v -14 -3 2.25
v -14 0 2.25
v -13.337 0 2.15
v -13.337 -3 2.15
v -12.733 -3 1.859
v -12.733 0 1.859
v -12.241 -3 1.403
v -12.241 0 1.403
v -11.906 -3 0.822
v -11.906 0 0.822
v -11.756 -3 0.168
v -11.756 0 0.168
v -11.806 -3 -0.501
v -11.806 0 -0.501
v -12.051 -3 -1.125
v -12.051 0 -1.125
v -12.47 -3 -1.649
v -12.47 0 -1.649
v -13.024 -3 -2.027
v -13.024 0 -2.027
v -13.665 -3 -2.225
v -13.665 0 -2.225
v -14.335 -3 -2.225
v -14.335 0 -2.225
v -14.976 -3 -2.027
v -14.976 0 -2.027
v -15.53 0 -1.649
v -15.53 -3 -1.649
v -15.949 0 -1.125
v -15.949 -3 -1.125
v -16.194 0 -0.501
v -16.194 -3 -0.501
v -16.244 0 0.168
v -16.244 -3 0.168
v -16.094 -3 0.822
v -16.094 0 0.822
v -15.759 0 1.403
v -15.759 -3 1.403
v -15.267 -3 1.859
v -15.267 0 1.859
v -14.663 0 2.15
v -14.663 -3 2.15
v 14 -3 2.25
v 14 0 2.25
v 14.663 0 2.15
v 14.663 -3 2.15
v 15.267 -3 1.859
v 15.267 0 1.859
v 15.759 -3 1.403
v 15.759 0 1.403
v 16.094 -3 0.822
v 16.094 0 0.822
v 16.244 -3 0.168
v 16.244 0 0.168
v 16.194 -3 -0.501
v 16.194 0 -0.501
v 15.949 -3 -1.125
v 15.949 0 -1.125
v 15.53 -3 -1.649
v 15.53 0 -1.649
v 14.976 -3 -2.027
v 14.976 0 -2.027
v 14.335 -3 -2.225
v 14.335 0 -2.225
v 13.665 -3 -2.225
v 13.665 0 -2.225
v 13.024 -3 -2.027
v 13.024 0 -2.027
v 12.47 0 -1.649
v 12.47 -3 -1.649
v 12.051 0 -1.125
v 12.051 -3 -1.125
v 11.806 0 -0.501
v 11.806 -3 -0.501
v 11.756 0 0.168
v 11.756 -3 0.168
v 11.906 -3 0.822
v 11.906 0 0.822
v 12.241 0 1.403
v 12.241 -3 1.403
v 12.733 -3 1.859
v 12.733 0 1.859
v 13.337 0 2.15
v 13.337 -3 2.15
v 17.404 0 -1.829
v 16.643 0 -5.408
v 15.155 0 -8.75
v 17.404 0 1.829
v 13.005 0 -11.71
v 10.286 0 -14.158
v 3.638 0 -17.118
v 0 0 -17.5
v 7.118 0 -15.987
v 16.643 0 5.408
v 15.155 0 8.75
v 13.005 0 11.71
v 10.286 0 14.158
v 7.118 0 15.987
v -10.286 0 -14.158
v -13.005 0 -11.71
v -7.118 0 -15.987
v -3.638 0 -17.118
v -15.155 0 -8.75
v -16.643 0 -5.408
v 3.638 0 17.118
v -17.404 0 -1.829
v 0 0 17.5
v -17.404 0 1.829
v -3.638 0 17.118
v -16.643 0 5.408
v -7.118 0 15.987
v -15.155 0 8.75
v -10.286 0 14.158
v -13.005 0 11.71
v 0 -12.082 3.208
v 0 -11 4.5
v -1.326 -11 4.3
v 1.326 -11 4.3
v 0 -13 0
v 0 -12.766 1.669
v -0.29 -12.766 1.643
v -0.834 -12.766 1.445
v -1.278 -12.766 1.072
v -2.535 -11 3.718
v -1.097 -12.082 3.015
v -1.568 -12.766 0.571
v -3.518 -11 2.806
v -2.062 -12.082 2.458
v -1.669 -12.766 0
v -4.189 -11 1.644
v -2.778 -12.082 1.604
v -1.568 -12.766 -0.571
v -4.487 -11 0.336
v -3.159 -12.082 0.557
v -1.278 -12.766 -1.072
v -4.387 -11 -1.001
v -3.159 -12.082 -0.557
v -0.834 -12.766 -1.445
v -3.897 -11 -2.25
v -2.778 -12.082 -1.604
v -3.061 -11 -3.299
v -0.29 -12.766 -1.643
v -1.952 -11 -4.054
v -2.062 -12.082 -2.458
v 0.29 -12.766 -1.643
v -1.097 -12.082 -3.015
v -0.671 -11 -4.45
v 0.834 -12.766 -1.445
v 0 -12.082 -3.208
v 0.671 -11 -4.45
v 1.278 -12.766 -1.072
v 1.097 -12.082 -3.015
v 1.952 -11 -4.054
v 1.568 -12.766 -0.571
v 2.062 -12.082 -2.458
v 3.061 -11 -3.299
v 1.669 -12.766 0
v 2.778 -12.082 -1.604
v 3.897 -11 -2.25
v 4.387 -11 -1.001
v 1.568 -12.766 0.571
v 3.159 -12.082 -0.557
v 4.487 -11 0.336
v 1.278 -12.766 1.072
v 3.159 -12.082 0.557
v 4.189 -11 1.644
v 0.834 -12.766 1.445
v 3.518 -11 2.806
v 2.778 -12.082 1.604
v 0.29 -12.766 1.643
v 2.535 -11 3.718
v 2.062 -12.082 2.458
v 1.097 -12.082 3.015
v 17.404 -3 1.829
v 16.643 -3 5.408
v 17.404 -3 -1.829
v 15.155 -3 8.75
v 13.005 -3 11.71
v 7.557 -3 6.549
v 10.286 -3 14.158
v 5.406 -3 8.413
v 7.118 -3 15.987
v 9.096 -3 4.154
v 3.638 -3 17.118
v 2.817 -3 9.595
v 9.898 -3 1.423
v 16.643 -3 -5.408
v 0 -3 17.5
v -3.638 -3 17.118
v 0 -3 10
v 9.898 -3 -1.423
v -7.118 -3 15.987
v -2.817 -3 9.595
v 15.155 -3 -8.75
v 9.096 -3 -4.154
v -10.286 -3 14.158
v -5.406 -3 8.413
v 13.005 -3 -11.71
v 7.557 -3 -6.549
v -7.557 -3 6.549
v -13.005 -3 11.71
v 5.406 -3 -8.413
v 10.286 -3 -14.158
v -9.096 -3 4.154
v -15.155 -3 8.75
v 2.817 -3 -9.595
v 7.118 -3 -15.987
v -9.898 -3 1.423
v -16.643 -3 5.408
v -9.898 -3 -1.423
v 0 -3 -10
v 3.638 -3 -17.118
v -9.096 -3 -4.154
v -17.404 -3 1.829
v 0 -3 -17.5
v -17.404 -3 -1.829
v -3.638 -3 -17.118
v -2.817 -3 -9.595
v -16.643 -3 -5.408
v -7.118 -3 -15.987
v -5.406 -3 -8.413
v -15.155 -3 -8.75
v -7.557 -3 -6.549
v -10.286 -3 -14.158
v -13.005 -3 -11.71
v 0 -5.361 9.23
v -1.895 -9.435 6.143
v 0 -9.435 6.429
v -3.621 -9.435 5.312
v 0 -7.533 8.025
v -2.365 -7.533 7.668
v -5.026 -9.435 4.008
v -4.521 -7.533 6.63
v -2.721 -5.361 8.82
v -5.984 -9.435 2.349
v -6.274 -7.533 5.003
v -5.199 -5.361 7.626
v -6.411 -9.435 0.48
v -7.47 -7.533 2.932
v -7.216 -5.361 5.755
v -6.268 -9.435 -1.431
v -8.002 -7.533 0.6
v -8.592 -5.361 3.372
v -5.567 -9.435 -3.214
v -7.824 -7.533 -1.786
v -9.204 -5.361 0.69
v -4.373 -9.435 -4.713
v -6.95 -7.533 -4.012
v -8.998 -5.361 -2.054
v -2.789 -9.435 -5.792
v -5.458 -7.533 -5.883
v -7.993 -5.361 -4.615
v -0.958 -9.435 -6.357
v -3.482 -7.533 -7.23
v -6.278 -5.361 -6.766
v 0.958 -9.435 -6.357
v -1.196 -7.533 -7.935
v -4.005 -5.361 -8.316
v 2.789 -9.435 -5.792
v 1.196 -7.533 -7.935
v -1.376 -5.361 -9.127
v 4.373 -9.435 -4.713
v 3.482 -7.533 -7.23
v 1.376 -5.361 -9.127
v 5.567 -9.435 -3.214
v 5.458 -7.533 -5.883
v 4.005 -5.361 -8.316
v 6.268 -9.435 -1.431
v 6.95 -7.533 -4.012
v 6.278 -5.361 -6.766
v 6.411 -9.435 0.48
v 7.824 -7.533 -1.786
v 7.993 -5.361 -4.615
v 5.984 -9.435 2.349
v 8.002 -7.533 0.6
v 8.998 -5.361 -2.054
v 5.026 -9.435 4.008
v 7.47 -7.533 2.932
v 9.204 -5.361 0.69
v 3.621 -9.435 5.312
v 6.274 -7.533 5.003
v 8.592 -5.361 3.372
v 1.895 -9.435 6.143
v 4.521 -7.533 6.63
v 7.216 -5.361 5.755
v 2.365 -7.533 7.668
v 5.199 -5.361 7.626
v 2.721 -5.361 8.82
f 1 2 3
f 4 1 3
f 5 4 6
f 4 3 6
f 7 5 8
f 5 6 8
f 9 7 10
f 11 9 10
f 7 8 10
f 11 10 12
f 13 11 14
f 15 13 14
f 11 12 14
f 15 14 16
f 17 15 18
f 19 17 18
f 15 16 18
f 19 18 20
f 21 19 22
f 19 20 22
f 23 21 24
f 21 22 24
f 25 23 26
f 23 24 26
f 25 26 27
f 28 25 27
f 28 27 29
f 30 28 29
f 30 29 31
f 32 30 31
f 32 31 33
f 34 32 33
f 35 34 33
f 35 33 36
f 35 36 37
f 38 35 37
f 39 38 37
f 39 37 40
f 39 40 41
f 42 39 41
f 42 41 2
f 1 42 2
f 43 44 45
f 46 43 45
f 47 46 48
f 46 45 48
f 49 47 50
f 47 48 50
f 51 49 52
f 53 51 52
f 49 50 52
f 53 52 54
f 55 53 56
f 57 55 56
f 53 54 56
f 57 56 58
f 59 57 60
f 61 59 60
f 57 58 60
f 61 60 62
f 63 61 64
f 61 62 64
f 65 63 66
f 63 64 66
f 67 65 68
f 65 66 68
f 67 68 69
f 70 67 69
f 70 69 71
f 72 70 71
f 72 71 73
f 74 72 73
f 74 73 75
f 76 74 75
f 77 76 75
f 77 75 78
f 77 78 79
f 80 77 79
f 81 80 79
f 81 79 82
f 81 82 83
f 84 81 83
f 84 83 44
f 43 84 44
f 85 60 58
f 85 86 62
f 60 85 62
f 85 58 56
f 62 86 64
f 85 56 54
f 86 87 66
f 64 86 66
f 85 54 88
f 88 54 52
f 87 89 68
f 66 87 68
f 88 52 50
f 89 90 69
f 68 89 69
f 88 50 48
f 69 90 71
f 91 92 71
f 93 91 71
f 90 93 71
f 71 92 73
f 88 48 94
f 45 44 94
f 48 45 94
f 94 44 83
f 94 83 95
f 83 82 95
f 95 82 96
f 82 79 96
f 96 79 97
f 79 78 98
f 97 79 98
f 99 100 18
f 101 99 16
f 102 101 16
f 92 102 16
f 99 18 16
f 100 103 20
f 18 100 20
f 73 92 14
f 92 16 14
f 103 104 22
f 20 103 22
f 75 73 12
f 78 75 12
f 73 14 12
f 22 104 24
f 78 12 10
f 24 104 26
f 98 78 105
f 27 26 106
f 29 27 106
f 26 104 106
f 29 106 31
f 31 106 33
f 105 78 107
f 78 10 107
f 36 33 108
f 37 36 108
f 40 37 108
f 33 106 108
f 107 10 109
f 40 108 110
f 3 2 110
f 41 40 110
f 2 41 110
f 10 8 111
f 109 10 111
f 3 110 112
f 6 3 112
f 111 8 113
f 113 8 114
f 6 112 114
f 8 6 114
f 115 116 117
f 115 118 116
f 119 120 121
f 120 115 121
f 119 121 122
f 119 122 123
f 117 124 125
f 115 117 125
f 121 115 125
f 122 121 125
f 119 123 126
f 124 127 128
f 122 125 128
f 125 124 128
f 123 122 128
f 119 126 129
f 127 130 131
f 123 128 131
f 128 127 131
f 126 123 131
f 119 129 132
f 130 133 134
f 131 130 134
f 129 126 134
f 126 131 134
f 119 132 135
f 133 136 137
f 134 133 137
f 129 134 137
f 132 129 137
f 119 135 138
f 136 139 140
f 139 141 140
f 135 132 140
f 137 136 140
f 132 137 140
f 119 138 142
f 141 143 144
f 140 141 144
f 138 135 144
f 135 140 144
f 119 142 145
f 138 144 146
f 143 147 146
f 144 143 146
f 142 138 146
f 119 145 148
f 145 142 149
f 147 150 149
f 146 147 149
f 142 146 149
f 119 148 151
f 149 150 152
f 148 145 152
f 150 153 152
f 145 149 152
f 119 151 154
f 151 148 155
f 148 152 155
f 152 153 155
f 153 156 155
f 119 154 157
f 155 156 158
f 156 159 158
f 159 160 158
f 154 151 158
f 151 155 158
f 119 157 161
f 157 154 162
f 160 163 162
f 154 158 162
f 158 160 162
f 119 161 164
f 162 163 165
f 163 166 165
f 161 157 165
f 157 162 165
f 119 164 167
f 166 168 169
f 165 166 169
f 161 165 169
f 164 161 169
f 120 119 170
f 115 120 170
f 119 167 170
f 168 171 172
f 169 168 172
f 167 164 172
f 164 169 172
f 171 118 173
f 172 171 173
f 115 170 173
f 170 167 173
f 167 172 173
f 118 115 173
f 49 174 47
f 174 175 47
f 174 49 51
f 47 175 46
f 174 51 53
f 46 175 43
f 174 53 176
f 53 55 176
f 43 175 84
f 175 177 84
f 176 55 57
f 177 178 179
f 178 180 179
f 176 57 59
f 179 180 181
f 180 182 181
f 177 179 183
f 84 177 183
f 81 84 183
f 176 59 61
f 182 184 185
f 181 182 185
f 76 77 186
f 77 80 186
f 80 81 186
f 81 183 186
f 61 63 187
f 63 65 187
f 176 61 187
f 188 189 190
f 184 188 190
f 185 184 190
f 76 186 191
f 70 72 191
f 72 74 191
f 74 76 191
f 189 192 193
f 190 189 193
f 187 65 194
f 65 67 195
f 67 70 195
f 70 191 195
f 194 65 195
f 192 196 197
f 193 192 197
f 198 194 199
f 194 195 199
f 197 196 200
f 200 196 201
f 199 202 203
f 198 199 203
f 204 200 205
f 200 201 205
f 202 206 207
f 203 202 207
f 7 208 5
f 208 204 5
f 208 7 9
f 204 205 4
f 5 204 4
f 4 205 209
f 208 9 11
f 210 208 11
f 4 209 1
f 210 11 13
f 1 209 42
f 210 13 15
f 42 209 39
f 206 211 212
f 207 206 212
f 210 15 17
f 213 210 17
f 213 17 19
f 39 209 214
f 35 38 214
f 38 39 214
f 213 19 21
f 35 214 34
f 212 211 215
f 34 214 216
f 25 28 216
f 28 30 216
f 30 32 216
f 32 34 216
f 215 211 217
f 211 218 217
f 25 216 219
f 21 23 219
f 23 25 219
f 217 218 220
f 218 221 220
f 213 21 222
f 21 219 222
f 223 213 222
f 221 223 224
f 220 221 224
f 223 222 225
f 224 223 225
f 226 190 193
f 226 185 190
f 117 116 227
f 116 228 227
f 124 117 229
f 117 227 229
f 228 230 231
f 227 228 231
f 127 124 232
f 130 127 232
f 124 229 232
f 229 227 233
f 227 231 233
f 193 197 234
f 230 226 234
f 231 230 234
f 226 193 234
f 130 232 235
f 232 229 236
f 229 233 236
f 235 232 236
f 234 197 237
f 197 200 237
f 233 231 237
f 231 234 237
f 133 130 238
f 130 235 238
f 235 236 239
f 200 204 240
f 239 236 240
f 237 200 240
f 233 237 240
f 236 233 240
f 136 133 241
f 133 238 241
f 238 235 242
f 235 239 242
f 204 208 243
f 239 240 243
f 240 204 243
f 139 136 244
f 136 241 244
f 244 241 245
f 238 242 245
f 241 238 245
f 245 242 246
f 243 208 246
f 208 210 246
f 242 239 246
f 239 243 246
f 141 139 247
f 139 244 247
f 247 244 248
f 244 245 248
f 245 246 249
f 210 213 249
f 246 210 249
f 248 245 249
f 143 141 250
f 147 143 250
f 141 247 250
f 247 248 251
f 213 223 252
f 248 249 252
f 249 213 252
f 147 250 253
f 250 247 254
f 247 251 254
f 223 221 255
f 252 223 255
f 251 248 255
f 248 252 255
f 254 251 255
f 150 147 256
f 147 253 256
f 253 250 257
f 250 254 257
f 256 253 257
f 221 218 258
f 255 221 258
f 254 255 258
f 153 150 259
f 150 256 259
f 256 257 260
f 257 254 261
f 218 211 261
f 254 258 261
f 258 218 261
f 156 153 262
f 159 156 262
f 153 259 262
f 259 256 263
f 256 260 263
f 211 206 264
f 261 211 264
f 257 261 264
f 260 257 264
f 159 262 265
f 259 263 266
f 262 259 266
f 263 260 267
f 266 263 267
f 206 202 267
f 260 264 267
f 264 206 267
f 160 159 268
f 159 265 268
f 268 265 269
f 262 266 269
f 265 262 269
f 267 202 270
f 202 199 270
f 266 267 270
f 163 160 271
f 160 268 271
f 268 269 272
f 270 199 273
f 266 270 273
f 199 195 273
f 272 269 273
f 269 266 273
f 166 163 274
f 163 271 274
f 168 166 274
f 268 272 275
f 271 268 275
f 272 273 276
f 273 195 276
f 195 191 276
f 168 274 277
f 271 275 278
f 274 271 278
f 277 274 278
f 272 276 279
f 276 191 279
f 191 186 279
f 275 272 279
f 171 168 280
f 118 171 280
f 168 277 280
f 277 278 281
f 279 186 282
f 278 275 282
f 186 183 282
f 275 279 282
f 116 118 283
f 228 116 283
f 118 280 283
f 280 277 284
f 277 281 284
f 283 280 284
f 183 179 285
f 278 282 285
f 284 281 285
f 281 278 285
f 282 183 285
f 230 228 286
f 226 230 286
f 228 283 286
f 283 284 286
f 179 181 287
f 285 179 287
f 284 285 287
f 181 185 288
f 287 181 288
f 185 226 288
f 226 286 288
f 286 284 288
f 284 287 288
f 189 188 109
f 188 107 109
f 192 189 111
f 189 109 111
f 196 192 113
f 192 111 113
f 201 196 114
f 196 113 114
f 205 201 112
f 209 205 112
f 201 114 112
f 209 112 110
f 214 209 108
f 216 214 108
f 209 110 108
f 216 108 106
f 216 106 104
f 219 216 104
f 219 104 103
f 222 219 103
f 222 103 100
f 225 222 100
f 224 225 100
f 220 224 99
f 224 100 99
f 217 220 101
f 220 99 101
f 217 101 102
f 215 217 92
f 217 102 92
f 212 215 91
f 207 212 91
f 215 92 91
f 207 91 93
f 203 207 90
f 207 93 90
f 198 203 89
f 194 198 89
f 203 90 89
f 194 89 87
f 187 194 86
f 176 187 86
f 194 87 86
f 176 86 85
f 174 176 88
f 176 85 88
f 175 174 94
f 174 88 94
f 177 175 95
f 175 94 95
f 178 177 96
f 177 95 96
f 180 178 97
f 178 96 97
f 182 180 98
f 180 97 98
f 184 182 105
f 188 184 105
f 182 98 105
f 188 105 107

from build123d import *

# Parameters (mm, degrees)
CROQUIS3_R            = 2.25
CORTAR_EXTRUIR1_DEPTH = 28.955321497


with BuildPart() as part:
    # Croquis2 → Revolución2 (revolve)
    with BuildSketch(Plane.XY, mode=Mode.PRIVATE) as revoluci_n2_sk:
        with BuildLine():
            ThreePointArc((4.5, -2.875), (2.46221445, -1.397517486), (0, -0.875))
            Line((0, -0.875), (0, -13))
            ThreePointArc((0, -13), (2.46221445, -12.477482514), (4.5, -11))
            Line((4.5, -11), (4.5, -2.875))
        make_face()
        with BuildLine():
            ThreePointArc((6.0625, -6.9375), (5.658407738, -4.761189332), (4.5, -2.875))
            Line((4.5, -2.875), (4.5, -11))
            ThreePointArc((4.5, -11), (5.658407738, -9.113810668), (6.0625, -6.9375))
        make_face()
        with BuildLine():
            Line((4.5, 0), (0, 0))
            Line((0, 0), (0, -0.875))
            ThreePointArc((0, -0.875), (2.46221445, -1.397517486), (4.5, -2.875))
            Line((4.5, -2.875), (4.5, 0))
        make_face()
        with BuildLine():
            Line((17.5, 0), (4.5, 0))
            Line((4.5, 0), (4.5, -2.875))
            ThreePointArc((4.5, -2.875), (5.658407738, -4.761189332), (6.0625, -6.9375))
            ThreePointArc((6.0625, -6.9375), (5.658407738, -9.113810668), (4.5, -11))
            ThreePointArc((4.5, -11), (8.024807813, -7.532680371), (10, -3))
            Line((10, -3), (17.5, -3))
            Line((17.5, -3), (17.5, 0))
        make_face()
    revolve(revoluci_n2_sk.sketch.rotate(Axis((0, 0, 0), (0, -1, 0)), 90), axis=Axis((0, 0, 0), (0, -1, 0)))

    # Croquis3 → Cortar-Extruir1 (cut, through all)
    with BuildSketch(Plane(origin=(0, 0, 0), x_dir=(1, 0, 0), z_dir=(0, 1, 0))):
        with Locations(Location((14, 0, 0), (0, 0, 270))):
            Circle(CROQUIS3_R)
        with Locations(Location((-14, 0, 0), (0, 0, 270))):
            Circle(CROQUIS3_R)
    extrude(amount=-CORTAR_EXTRUIR1_DEPTH, mode=Mode.SUBTRACT)


solid = part.part
